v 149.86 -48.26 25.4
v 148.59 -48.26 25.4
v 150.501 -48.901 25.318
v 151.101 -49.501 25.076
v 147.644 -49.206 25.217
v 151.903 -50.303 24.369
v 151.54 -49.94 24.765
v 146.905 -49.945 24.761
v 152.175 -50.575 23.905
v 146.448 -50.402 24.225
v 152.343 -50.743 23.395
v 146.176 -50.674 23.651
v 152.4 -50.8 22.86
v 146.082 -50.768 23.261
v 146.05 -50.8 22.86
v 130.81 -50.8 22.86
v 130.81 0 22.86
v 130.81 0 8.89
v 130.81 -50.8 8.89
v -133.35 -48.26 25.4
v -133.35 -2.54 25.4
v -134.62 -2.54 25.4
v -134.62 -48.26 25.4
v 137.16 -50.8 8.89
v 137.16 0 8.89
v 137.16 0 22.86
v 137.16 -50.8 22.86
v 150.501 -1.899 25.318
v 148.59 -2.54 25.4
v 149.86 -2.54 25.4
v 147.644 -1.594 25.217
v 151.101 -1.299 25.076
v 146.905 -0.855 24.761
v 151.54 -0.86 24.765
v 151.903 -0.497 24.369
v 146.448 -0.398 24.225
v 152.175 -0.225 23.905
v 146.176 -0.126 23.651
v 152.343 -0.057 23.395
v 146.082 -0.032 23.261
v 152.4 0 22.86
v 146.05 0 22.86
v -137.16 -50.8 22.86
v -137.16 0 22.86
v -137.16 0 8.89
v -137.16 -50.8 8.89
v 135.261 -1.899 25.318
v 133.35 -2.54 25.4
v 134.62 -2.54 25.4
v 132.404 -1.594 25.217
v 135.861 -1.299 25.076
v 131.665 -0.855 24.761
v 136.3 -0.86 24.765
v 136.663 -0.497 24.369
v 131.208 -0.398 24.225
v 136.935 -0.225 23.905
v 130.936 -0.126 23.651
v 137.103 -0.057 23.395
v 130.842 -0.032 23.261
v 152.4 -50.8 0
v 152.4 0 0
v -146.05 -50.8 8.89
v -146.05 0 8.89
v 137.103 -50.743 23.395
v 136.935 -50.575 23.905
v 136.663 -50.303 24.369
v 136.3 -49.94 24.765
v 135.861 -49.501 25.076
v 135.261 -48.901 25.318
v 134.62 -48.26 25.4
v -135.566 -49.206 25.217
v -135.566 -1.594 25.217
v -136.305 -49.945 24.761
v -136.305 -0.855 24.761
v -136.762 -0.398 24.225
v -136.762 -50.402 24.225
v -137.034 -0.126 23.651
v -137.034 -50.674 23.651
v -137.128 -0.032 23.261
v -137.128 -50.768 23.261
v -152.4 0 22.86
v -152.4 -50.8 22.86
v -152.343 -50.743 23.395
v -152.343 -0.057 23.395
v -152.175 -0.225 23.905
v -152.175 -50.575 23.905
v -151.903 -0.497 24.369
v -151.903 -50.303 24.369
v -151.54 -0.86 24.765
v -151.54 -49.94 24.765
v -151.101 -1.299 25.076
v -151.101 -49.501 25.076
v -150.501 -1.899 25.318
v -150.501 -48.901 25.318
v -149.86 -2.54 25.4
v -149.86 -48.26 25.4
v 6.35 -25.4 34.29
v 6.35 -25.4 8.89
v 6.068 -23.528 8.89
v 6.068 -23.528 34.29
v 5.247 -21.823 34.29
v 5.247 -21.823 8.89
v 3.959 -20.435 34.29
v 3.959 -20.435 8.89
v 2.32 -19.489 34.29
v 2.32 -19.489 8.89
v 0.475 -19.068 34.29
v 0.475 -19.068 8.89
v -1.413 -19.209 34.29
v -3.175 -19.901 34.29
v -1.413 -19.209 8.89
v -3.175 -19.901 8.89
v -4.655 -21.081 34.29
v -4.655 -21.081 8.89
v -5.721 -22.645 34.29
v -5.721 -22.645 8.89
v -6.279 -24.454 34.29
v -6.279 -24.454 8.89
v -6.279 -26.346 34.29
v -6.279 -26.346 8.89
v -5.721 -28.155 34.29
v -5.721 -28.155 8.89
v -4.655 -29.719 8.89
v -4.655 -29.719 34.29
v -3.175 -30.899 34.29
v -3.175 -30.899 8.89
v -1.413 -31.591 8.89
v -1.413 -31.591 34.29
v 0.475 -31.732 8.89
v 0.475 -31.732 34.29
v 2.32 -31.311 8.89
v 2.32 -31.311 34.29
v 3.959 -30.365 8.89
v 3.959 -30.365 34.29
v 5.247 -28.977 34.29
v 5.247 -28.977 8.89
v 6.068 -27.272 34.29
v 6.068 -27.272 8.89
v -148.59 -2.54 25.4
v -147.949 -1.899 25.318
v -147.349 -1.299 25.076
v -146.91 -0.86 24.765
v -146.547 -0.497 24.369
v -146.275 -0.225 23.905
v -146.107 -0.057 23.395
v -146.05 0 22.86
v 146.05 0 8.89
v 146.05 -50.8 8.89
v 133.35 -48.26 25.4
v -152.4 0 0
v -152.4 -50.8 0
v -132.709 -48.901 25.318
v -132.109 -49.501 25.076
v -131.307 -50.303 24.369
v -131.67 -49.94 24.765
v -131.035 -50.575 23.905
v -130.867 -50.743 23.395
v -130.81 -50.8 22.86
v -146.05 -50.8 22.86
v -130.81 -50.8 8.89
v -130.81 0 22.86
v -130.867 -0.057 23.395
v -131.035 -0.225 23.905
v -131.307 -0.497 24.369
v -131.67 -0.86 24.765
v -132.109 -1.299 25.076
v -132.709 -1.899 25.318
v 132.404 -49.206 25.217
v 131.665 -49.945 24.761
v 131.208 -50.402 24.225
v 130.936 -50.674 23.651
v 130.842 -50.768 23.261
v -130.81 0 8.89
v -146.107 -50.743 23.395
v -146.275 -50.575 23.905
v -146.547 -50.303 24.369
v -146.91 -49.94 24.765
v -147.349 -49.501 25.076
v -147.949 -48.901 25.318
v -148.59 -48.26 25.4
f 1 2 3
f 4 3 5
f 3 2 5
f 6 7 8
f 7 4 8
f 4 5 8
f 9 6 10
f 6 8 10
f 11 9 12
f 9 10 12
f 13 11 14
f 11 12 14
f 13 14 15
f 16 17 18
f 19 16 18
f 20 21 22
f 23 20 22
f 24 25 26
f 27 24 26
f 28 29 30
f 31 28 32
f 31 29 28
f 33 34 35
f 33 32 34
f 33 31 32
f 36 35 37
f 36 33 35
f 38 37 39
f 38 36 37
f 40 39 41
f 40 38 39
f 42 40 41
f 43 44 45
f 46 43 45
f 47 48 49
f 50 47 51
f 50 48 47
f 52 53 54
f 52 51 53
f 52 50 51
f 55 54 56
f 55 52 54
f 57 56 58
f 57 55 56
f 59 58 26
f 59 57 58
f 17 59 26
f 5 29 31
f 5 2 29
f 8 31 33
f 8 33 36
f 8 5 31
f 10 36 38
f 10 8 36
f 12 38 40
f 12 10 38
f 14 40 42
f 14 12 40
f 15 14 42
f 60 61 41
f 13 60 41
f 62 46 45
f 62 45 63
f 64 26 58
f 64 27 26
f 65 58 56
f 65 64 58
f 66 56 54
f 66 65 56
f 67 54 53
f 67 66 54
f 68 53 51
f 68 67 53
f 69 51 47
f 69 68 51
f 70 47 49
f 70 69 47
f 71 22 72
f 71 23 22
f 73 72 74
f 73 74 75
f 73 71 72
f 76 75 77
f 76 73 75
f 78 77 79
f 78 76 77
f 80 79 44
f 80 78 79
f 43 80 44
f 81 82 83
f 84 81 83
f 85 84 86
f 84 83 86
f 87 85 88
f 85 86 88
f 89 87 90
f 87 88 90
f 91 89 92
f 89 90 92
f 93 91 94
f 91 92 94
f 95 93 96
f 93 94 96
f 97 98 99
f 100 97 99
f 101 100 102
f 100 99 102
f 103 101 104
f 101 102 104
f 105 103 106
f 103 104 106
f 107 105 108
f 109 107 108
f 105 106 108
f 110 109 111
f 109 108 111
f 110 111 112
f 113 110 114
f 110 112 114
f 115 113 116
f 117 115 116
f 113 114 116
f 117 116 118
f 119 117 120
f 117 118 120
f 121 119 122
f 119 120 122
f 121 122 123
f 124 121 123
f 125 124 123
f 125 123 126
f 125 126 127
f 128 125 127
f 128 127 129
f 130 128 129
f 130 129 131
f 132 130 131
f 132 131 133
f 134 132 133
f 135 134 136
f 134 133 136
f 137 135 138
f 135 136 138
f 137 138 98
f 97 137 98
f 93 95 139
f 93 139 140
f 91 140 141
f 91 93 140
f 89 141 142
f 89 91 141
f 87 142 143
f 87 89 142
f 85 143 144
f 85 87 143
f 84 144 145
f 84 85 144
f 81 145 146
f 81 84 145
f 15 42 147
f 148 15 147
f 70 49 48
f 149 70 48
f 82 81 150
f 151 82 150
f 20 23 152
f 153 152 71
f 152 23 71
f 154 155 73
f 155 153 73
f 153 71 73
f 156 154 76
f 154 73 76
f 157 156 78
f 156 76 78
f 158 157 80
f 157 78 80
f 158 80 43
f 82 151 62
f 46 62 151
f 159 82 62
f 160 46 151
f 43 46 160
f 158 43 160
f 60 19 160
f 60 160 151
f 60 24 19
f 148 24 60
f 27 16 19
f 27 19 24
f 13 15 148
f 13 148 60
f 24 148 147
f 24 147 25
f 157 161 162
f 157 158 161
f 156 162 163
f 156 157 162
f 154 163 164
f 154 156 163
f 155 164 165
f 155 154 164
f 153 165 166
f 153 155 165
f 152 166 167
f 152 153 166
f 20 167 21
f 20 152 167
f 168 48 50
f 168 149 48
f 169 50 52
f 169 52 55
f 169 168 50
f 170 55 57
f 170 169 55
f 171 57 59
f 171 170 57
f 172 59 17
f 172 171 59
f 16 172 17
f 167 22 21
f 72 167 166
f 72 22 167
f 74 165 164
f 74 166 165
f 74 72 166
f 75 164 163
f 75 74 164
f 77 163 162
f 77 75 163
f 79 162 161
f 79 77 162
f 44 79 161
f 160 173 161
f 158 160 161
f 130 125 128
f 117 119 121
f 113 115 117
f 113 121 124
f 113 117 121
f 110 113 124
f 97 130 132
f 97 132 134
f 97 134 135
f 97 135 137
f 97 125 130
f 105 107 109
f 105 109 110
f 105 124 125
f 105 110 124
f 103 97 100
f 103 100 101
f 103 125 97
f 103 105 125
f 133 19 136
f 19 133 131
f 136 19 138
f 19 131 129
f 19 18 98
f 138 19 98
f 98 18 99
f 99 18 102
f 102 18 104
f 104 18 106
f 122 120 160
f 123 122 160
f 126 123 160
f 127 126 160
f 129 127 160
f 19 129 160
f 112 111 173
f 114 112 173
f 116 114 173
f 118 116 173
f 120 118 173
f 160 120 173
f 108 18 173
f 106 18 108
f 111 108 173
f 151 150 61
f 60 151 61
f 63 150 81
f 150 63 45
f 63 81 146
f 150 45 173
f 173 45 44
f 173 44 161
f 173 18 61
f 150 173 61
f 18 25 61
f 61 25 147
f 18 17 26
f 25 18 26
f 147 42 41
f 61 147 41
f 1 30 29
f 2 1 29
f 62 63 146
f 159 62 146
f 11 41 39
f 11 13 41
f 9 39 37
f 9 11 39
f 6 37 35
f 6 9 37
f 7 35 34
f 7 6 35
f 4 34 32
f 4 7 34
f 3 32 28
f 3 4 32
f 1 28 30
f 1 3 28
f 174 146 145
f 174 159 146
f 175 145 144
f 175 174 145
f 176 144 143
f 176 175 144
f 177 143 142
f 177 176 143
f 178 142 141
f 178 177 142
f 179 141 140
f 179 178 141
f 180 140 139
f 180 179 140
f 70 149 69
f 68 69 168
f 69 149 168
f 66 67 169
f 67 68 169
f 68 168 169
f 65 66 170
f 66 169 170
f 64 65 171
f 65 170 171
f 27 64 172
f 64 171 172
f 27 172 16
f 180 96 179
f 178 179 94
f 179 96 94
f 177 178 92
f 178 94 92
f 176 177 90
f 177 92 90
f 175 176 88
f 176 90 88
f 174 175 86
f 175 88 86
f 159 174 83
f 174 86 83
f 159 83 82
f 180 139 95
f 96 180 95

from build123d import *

# Parameters (mm, degrees)
F1_DEPTH = 50.8
F2_R     = 2.54
F3_R     = 6.35
F4_DEPTH = 25.4


with BuildPart() as f1:
    # F0 (on Front) → F1 (new body)
    with BuildSketch(Plane.XZ):
        Polygon((-152.4, 25.4), (-152.4, 0), (0, 0), (152.4, 0), (152.4, 25.4), (146.05, 25.4), (146.05, 8.89), (137.16, 8.89), (137.16, 25.4), (130.81, 25.4), (130.81, 8.89), (0, 8.89), (-130.81, 8.89), (-130.81, 25.4), (-137.16, 25.4), (-137.16, 8.89), (-146.05, 8.89), (-146.05, 25.4), align=None)
    extrude(amount=F1_DEPTH)

    # F2
    f2_edges = [f1.edges().sort_by_distance(p)[0] for p in [
        (-146.05, -25.4, 25.4),
        (-152.4, -25.4, 25.4),
        (-149.225, 0, 25.4),
        (-149.225, -50.8, 25.4),
        (-130.81, -25.4, 25.4),
        (-137.16, -25.4, 25.4),
        (-133.985, 0, 25.4),
        (-133.985, -50.8, 25.4),
        (137.16, -25.4, 25.4),
        (130.81, -25.4, 25.4),
        (133.985, 0, 25.4),
        (133.985, -50.8, 25.4),
        (152.4, -25.4, 25.4),
        (146.05, -25.4, 25.4),
        (149.225, 0, 25.4),
        (149.225, -50.8, 25.4),
    ]]
    fillet(f2_edges, radius=F2_R)

    # F3 (on face) → F4 (join)
    with BuildSketch(Plane.XY.offset(8.89)):
        with Locations((0, -25.4)):
            Circle(F3_R)
    extrude(amount=F4_DEPTH)


solid = f1.part
